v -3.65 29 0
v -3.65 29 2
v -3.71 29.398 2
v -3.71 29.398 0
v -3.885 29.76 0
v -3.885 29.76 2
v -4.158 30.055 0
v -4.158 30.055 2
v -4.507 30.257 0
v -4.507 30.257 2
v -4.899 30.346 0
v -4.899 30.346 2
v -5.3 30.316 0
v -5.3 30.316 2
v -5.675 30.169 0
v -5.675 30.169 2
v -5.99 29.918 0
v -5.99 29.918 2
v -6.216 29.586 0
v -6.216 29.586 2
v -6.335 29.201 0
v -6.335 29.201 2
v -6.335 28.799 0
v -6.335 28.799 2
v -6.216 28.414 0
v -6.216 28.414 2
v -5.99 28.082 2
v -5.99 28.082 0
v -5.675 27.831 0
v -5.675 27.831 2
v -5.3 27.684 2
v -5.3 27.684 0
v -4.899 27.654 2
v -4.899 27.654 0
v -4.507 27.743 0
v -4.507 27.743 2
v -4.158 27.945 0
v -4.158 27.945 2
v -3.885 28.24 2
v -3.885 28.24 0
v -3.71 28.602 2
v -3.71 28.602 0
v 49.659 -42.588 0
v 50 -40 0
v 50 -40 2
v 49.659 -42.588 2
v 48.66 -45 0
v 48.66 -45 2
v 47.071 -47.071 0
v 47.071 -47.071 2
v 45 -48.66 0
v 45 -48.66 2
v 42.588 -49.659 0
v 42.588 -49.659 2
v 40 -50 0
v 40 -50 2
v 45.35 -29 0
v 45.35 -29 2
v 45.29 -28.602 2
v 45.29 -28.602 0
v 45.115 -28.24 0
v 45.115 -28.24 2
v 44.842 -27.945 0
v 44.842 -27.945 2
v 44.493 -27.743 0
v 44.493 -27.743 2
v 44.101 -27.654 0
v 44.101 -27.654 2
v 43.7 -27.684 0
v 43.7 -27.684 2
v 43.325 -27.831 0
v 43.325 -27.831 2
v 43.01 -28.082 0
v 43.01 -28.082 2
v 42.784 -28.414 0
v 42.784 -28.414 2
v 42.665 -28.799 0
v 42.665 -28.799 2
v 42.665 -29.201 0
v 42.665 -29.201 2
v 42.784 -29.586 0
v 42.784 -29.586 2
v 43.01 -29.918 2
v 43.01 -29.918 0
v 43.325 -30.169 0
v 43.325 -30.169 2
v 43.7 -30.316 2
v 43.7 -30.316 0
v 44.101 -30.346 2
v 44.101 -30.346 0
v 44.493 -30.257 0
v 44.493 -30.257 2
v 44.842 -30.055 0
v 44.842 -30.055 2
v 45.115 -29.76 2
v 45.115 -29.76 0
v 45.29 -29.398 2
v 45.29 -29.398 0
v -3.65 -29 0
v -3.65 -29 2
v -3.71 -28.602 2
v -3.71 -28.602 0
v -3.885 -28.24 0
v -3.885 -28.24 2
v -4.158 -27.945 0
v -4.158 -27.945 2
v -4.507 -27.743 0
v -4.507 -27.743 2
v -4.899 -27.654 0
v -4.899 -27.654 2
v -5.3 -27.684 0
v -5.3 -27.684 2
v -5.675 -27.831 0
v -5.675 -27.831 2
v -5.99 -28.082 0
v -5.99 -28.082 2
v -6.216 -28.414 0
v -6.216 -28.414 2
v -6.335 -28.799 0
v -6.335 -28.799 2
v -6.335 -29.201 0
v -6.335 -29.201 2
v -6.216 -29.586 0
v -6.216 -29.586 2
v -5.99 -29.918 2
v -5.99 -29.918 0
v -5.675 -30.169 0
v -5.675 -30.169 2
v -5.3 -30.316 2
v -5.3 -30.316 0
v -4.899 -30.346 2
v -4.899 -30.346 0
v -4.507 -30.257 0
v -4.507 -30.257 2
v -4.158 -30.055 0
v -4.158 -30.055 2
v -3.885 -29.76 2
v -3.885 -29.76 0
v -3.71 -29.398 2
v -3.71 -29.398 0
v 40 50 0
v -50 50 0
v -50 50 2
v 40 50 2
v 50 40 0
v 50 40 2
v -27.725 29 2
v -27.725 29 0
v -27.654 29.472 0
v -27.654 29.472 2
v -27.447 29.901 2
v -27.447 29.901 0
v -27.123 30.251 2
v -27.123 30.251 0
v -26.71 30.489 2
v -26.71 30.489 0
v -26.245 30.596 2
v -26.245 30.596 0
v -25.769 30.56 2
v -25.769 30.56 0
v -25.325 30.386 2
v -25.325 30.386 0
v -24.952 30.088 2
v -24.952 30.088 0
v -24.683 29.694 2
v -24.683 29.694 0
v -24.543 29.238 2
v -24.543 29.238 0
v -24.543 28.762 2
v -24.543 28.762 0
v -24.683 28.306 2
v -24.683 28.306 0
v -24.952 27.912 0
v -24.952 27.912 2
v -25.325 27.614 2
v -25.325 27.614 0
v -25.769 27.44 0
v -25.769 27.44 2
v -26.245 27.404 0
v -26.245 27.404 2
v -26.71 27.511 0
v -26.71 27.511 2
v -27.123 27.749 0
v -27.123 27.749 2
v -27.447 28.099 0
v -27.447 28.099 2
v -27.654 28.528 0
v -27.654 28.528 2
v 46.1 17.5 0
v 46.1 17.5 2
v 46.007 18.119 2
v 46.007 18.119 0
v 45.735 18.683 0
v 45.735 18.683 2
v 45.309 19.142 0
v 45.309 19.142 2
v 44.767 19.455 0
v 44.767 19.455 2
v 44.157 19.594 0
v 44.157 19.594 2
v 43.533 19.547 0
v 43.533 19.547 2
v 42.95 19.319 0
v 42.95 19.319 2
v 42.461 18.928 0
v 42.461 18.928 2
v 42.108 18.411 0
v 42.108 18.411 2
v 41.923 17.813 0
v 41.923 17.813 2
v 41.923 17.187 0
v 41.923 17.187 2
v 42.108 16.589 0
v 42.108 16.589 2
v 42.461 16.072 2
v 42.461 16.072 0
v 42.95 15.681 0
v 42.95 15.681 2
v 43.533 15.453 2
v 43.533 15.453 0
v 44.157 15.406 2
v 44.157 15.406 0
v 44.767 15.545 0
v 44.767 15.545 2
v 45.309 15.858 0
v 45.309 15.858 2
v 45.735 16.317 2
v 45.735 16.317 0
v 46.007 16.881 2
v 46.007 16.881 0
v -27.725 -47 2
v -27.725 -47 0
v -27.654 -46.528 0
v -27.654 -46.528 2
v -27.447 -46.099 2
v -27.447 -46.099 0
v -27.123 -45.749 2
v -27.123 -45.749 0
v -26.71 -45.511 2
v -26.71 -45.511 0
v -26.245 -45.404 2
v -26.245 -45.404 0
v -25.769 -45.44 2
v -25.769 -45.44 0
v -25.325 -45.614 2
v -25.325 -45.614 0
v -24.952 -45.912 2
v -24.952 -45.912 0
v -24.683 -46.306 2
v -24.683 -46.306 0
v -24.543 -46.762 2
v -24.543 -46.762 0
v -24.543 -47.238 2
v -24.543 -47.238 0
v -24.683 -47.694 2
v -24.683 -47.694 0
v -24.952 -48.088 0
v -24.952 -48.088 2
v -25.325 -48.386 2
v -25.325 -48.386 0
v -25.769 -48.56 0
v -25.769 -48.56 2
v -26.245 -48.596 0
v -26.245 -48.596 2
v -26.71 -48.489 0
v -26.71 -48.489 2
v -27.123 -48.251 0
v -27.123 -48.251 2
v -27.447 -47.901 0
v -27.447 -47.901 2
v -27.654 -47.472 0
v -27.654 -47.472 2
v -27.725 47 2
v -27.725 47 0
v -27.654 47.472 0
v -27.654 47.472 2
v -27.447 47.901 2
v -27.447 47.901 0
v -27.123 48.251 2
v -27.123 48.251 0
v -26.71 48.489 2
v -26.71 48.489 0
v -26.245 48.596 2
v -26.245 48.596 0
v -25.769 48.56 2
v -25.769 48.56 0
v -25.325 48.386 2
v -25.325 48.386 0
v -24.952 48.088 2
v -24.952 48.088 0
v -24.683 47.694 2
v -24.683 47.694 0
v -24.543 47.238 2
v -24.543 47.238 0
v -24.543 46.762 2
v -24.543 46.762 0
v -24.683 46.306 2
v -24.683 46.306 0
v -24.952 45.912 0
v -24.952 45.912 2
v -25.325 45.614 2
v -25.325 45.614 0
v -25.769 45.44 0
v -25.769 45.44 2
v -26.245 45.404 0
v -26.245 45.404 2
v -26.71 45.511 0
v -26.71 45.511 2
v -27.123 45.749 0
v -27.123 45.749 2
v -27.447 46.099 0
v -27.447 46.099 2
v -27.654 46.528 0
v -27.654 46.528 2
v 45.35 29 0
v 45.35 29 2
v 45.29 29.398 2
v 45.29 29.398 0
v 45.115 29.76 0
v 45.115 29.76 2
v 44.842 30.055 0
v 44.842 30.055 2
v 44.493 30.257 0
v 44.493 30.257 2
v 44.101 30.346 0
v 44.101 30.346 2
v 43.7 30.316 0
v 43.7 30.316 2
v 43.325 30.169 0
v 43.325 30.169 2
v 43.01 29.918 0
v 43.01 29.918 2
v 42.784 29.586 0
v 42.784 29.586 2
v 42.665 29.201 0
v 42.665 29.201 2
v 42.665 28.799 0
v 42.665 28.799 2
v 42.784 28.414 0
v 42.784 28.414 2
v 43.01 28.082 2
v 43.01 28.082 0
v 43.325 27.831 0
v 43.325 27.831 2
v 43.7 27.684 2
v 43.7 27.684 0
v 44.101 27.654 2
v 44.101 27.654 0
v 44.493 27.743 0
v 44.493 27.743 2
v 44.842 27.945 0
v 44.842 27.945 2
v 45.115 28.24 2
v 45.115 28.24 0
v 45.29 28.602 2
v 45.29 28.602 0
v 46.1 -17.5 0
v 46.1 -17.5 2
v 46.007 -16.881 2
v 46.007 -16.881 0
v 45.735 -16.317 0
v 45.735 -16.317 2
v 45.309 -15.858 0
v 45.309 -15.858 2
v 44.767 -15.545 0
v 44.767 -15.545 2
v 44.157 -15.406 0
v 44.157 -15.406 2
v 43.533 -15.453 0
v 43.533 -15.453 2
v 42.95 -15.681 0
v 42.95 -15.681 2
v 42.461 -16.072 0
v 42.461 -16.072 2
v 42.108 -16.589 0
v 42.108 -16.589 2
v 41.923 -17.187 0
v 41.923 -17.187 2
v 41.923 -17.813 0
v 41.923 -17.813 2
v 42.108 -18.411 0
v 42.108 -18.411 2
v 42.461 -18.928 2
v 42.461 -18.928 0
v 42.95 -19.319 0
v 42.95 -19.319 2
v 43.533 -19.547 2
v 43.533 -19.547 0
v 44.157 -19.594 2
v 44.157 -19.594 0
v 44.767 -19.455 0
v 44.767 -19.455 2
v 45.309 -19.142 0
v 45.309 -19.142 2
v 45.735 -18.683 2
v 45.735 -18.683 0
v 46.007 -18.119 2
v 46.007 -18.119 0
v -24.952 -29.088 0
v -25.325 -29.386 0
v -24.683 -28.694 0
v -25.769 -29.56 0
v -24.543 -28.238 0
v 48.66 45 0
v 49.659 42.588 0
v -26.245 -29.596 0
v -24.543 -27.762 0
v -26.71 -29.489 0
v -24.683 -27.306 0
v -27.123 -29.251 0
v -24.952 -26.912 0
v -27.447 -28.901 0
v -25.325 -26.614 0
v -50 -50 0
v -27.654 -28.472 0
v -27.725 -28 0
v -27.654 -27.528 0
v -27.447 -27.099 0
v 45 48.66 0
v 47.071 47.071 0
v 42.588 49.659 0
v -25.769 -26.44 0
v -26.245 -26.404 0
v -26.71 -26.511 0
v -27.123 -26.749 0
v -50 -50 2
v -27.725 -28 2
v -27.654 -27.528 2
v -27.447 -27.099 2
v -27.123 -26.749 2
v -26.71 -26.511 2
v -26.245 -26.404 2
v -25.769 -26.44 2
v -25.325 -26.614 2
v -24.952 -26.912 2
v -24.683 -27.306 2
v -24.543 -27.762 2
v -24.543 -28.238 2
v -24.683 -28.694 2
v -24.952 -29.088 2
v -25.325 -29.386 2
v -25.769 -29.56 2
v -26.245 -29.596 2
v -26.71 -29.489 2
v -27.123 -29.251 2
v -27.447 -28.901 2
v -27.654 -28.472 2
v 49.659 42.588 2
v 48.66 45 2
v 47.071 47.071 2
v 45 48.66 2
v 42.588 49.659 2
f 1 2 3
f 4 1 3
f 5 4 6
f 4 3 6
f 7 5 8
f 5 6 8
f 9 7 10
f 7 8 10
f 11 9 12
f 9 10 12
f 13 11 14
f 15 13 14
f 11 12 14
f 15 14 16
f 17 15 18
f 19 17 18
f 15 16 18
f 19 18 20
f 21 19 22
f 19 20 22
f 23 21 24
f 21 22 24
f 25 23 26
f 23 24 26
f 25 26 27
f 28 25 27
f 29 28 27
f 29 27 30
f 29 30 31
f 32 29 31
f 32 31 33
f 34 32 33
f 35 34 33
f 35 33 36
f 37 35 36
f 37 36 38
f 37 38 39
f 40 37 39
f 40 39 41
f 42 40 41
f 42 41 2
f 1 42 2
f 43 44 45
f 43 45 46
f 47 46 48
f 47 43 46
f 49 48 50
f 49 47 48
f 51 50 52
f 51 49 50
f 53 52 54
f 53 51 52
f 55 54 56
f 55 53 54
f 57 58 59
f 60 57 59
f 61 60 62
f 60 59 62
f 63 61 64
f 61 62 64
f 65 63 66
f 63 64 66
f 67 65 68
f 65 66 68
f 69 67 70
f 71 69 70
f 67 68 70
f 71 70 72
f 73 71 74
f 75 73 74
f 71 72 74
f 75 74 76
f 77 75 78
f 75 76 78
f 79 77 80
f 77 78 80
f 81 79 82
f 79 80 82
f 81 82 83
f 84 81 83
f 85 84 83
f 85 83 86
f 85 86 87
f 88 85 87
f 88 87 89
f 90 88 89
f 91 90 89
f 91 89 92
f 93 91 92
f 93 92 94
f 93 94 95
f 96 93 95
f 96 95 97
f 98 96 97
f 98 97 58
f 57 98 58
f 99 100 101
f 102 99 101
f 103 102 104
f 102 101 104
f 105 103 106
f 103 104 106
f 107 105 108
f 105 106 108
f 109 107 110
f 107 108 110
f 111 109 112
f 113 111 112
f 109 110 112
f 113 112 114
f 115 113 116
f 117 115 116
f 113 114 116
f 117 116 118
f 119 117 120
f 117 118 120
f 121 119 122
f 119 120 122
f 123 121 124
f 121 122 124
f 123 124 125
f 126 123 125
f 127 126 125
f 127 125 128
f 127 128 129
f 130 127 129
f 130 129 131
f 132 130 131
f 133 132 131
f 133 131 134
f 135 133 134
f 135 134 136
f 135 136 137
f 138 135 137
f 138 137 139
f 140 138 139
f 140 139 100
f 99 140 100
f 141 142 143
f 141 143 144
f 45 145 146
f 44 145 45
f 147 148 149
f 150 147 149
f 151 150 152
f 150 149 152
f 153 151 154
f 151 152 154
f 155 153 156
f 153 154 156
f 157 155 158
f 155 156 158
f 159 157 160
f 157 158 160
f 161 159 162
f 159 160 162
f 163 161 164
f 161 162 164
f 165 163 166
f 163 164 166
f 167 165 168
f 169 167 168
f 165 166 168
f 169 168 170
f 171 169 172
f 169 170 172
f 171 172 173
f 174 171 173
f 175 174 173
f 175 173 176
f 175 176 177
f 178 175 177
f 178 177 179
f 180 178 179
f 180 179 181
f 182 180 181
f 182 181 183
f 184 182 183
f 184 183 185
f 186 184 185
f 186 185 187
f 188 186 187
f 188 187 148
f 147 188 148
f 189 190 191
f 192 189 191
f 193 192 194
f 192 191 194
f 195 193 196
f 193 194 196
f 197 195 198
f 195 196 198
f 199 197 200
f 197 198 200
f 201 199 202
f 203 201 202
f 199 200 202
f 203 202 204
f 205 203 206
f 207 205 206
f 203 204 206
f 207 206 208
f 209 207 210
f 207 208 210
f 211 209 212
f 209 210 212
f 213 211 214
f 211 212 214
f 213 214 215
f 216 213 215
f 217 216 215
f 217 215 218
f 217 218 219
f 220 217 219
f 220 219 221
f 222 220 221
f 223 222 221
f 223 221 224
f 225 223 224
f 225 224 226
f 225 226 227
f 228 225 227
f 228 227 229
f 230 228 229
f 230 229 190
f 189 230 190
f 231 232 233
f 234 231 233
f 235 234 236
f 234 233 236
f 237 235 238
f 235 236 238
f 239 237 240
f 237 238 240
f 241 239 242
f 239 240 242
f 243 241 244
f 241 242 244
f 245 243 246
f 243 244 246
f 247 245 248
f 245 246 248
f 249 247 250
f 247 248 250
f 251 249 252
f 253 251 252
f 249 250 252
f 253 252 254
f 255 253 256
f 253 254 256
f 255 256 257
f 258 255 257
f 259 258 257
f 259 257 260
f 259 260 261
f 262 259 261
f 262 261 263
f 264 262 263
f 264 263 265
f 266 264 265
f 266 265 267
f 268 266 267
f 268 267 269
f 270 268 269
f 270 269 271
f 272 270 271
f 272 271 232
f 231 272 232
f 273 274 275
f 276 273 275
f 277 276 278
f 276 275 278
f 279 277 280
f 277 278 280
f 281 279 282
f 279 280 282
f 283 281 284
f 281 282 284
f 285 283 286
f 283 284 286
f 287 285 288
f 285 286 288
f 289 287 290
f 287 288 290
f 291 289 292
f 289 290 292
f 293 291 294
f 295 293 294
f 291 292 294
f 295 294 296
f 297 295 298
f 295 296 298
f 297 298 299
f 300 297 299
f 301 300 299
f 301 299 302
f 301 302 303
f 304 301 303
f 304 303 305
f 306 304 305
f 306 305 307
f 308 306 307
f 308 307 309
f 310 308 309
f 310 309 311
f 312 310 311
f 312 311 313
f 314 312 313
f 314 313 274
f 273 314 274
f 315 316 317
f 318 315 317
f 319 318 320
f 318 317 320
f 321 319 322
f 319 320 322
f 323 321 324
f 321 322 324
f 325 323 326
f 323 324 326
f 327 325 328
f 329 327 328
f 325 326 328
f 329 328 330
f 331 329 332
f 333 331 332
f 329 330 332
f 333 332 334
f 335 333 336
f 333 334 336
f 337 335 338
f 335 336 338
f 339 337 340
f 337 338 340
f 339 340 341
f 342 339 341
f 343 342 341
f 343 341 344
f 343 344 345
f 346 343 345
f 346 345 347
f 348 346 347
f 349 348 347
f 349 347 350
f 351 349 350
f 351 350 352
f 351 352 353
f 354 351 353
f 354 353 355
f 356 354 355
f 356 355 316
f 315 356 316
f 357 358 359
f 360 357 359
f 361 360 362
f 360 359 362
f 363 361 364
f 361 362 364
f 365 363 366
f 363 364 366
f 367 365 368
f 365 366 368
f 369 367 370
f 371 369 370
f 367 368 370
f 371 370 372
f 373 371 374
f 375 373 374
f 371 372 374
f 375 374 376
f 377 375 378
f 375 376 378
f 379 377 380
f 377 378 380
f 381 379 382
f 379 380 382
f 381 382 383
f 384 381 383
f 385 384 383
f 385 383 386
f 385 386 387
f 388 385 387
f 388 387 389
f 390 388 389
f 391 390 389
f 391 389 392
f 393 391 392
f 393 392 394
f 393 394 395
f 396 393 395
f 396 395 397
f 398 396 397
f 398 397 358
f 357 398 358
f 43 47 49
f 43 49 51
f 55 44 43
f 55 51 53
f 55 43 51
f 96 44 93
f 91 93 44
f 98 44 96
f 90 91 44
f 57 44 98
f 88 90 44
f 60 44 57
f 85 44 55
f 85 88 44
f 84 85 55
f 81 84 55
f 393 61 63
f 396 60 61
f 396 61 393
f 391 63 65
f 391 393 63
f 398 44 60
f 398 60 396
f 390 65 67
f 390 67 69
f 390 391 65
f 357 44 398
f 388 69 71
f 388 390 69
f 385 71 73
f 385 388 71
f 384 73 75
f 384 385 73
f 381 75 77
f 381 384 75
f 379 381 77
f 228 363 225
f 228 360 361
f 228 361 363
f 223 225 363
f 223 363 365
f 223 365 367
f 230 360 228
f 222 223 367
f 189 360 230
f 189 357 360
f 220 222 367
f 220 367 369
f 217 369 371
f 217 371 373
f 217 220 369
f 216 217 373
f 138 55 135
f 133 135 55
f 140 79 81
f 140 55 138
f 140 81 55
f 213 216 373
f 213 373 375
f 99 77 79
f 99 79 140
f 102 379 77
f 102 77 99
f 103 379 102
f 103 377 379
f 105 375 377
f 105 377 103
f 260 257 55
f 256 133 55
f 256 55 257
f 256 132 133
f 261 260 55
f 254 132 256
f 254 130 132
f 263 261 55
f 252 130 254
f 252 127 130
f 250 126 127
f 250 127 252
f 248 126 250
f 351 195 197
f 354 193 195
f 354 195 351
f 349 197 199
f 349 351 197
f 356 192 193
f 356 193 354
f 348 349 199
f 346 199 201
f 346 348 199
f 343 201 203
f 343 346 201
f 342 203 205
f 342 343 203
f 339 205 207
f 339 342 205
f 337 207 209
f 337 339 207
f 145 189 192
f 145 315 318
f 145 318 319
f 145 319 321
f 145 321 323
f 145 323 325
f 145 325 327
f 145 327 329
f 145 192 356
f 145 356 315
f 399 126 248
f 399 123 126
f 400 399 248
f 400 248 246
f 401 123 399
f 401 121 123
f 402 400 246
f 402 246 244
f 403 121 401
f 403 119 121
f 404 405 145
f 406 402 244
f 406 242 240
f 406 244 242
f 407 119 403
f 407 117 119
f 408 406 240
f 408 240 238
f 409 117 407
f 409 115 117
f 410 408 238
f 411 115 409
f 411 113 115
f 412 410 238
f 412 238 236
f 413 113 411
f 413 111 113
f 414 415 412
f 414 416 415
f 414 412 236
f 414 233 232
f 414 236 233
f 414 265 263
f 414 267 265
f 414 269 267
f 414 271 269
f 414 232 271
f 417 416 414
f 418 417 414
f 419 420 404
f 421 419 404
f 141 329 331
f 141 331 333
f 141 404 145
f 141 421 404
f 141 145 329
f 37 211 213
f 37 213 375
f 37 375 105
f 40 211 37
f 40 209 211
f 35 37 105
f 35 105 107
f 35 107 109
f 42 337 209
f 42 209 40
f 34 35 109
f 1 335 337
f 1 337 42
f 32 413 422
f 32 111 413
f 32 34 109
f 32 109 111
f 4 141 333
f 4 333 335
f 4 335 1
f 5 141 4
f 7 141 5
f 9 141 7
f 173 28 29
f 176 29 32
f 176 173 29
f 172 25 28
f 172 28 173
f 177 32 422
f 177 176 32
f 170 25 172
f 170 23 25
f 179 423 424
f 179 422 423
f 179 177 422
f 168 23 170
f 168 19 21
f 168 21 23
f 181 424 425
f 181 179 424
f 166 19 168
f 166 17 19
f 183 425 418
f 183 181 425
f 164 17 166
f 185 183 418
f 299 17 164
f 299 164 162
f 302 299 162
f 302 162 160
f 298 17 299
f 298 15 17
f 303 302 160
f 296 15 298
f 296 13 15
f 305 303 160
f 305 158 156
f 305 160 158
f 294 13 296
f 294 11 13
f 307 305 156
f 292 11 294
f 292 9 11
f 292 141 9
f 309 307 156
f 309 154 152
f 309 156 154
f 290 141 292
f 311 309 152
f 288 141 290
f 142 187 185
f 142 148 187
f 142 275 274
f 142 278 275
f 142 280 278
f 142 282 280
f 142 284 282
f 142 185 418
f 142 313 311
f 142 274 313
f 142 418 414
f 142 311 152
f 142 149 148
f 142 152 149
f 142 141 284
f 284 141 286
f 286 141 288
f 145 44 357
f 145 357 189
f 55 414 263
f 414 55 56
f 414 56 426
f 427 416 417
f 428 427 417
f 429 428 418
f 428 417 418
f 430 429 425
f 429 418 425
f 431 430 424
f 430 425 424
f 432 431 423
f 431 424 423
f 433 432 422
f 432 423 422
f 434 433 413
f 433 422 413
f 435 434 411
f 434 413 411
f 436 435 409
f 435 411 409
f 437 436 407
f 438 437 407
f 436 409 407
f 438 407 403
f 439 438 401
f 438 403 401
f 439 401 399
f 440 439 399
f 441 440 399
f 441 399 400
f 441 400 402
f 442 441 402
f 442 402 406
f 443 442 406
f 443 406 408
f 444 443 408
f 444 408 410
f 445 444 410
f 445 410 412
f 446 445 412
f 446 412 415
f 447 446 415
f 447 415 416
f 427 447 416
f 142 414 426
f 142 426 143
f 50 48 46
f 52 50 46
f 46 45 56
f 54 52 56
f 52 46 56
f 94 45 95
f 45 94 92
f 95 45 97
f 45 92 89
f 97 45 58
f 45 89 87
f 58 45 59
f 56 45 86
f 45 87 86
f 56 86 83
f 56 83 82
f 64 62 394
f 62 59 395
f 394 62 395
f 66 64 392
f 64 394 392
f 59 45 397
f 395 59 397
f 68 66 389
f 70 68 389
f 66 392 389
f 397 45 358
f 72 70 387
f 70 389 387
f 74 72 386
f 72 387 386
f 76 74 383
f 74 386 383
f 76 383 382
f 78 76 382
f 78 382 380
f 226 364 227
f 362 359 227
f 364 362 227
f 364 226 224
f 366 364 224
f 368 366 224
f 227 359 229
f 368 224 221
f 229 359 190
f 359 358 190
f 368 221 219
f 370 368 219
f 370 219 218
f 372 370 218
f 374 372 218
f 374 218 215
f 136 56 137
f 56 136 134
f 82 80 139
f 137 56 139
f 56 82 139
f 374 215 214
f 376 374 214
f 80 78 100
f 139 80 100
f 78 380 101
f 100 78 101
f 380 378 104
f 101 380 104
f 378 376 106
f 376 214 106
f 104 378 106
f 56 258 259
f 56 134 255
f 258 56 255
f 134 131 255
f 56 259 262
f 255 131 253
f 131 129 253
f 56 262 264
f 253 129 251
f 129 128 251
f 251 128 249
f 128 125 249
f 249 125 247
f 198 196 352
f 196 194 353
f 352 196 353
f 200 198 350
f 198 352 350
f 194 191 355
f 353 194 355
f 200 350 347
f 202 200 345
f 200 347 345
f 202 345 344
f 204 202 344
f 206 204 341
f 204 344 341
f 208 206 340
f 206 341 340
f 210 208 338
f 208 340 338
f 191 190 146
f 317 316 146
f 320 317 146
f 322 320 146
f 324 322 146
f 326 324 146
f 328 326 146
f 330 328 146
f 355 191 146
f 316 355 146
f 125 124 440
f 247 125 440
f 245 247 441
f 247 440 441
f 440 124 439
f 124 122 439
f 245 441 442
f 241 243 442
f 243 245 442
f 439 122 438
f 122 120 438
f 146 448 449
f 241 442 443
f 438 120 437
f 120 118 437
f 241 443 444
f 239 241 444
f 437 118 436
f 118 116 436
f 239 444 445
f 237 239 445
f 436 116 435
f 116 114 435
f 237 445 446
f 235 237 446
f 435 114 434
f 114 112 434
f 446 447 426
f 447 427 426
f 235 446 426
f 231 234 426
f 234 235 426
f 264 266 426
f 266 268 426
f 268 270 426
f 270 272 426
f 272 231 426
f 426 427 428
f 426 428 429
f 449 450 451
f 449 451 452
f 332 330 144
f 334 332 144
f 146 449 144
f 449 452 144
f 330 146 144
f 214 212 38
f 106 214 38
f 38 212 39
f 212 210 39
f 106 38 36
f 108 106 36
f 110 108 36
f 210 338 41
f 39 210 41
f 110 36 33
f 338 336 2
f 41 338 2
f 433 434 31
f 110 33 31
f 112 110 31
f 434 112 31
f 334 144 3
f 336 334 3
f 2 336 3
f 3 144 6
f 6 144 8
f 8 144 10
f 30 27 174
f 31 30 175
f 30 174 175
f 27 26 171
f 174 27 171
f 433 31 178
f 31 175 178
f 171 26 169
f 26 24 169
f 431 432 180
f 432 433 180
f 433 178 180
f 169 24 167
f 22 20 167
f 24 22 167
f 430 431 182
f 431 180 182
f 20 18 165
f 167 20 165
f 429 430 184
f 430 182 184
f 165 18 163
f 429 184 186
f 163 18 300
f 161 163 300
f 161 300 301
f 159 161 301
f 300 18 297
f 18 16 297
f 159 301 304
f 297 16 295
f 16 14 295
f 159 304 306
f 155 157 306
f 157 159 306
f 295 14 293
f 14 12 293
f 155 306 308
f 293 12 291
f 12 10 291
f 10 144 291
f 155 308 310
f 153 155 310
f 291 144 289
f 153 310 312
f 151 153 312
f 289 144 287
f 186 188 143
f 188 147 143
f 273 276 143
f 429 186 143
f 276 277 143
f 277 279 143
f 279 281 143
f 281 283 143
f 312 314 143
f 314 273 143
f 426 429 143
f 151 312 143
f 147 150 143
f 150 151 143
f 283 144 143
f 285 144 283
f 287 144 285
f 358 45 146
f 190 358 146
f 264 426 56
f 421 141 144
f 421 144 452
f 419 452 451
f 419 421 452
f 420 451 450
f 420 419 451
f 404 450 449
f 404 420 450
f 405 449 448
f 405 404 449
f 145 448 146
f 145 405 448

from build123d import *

# Parameters (mm, degrees)
EXTRUDE_1_DEPTH     = 2
SKETCH_3_R          = 1.35
CUT_EXTRUDE_1_DEPTH = 3
SKETCH_7_R          = 2.1
CUT_EXTRUDE_5_DEPTH = 10
SKETCH_8_R          = 1.6
CUT_EXTRUDE_6_DEPTH = 3


with BuildPart() as part:
    # 草图1 → 凸台-拉伸1 (new body)
    with BuildSketch(Plane.XY):
        with BuildLine():
            Line((-50, 50), (40, 50))
            ThreePointArc((40, 50), (47.071067812, 47.071067812), (50, 40))
            Line((50, 40), (50, -40))
            ThreePointArc((50, -40), (47.071067812, -47.071067812), (40, -50))
            Line((40, -50), (-50, -50))
            Line((-50, -50), (-50, 50))
        make_face()
    extrude(amount=EXTRUDE_1_DEPTH)

    # 草图3 → 切除-拉伸1 (cut, through all)
    with BuildSketch(Plane.XY.offset(2)):
        with Locations((-5, -29)):
            Circle(SKETCH_3_R)
        with Locations((-5, 29)):
            Circle(SKETCH_3_R)
        with Locations((44, 29)):
            Circle(SKETCH_3_R)
        with Locations((44, -29)):
            Circle(SKETCH_3_R)
    extrude(amount=-CUT_EXTRUDE_1_DEPTH, mode=Mode.SUBTRACT)

    # 草图7 → 切除-拉伸5 (cut)
    with BuildSketch(Plane.XY.offset(2)):
        with Locations((44, 17.5)):
            Circle(SKETCH_7_R)
        with Locations((44, -17.5)):
            Circle(SKETCH_7_R)
    extrude(amount=-CUT_EXTRUDE_5_DEPTH, mode=Mode.SUBTRACT)

    # 草图8 → 切除-拉伸6 (cut, through all)
    with BuildSketch(Plane(origin=(0, 0, 0), x_dir=(-1, 0, 0), z_dir=(0, 0, -1))):
        with Locations((26.125, -47)):
            Circle(SKETCH_8_R)
        with Locations((26.125, -28)):
            Circle(SKETCH_8_R)
        with Locations((26.125, 29)):
            Circle(SKETCH_8_R)
        with Locations((26.125, 47)):
            Circle(SKETCH_8_R)
    extrude(amount=-CUT_EXTRUDE_6_DEPTH, mode=Mode.SUBTRACT)


solid = part.part
